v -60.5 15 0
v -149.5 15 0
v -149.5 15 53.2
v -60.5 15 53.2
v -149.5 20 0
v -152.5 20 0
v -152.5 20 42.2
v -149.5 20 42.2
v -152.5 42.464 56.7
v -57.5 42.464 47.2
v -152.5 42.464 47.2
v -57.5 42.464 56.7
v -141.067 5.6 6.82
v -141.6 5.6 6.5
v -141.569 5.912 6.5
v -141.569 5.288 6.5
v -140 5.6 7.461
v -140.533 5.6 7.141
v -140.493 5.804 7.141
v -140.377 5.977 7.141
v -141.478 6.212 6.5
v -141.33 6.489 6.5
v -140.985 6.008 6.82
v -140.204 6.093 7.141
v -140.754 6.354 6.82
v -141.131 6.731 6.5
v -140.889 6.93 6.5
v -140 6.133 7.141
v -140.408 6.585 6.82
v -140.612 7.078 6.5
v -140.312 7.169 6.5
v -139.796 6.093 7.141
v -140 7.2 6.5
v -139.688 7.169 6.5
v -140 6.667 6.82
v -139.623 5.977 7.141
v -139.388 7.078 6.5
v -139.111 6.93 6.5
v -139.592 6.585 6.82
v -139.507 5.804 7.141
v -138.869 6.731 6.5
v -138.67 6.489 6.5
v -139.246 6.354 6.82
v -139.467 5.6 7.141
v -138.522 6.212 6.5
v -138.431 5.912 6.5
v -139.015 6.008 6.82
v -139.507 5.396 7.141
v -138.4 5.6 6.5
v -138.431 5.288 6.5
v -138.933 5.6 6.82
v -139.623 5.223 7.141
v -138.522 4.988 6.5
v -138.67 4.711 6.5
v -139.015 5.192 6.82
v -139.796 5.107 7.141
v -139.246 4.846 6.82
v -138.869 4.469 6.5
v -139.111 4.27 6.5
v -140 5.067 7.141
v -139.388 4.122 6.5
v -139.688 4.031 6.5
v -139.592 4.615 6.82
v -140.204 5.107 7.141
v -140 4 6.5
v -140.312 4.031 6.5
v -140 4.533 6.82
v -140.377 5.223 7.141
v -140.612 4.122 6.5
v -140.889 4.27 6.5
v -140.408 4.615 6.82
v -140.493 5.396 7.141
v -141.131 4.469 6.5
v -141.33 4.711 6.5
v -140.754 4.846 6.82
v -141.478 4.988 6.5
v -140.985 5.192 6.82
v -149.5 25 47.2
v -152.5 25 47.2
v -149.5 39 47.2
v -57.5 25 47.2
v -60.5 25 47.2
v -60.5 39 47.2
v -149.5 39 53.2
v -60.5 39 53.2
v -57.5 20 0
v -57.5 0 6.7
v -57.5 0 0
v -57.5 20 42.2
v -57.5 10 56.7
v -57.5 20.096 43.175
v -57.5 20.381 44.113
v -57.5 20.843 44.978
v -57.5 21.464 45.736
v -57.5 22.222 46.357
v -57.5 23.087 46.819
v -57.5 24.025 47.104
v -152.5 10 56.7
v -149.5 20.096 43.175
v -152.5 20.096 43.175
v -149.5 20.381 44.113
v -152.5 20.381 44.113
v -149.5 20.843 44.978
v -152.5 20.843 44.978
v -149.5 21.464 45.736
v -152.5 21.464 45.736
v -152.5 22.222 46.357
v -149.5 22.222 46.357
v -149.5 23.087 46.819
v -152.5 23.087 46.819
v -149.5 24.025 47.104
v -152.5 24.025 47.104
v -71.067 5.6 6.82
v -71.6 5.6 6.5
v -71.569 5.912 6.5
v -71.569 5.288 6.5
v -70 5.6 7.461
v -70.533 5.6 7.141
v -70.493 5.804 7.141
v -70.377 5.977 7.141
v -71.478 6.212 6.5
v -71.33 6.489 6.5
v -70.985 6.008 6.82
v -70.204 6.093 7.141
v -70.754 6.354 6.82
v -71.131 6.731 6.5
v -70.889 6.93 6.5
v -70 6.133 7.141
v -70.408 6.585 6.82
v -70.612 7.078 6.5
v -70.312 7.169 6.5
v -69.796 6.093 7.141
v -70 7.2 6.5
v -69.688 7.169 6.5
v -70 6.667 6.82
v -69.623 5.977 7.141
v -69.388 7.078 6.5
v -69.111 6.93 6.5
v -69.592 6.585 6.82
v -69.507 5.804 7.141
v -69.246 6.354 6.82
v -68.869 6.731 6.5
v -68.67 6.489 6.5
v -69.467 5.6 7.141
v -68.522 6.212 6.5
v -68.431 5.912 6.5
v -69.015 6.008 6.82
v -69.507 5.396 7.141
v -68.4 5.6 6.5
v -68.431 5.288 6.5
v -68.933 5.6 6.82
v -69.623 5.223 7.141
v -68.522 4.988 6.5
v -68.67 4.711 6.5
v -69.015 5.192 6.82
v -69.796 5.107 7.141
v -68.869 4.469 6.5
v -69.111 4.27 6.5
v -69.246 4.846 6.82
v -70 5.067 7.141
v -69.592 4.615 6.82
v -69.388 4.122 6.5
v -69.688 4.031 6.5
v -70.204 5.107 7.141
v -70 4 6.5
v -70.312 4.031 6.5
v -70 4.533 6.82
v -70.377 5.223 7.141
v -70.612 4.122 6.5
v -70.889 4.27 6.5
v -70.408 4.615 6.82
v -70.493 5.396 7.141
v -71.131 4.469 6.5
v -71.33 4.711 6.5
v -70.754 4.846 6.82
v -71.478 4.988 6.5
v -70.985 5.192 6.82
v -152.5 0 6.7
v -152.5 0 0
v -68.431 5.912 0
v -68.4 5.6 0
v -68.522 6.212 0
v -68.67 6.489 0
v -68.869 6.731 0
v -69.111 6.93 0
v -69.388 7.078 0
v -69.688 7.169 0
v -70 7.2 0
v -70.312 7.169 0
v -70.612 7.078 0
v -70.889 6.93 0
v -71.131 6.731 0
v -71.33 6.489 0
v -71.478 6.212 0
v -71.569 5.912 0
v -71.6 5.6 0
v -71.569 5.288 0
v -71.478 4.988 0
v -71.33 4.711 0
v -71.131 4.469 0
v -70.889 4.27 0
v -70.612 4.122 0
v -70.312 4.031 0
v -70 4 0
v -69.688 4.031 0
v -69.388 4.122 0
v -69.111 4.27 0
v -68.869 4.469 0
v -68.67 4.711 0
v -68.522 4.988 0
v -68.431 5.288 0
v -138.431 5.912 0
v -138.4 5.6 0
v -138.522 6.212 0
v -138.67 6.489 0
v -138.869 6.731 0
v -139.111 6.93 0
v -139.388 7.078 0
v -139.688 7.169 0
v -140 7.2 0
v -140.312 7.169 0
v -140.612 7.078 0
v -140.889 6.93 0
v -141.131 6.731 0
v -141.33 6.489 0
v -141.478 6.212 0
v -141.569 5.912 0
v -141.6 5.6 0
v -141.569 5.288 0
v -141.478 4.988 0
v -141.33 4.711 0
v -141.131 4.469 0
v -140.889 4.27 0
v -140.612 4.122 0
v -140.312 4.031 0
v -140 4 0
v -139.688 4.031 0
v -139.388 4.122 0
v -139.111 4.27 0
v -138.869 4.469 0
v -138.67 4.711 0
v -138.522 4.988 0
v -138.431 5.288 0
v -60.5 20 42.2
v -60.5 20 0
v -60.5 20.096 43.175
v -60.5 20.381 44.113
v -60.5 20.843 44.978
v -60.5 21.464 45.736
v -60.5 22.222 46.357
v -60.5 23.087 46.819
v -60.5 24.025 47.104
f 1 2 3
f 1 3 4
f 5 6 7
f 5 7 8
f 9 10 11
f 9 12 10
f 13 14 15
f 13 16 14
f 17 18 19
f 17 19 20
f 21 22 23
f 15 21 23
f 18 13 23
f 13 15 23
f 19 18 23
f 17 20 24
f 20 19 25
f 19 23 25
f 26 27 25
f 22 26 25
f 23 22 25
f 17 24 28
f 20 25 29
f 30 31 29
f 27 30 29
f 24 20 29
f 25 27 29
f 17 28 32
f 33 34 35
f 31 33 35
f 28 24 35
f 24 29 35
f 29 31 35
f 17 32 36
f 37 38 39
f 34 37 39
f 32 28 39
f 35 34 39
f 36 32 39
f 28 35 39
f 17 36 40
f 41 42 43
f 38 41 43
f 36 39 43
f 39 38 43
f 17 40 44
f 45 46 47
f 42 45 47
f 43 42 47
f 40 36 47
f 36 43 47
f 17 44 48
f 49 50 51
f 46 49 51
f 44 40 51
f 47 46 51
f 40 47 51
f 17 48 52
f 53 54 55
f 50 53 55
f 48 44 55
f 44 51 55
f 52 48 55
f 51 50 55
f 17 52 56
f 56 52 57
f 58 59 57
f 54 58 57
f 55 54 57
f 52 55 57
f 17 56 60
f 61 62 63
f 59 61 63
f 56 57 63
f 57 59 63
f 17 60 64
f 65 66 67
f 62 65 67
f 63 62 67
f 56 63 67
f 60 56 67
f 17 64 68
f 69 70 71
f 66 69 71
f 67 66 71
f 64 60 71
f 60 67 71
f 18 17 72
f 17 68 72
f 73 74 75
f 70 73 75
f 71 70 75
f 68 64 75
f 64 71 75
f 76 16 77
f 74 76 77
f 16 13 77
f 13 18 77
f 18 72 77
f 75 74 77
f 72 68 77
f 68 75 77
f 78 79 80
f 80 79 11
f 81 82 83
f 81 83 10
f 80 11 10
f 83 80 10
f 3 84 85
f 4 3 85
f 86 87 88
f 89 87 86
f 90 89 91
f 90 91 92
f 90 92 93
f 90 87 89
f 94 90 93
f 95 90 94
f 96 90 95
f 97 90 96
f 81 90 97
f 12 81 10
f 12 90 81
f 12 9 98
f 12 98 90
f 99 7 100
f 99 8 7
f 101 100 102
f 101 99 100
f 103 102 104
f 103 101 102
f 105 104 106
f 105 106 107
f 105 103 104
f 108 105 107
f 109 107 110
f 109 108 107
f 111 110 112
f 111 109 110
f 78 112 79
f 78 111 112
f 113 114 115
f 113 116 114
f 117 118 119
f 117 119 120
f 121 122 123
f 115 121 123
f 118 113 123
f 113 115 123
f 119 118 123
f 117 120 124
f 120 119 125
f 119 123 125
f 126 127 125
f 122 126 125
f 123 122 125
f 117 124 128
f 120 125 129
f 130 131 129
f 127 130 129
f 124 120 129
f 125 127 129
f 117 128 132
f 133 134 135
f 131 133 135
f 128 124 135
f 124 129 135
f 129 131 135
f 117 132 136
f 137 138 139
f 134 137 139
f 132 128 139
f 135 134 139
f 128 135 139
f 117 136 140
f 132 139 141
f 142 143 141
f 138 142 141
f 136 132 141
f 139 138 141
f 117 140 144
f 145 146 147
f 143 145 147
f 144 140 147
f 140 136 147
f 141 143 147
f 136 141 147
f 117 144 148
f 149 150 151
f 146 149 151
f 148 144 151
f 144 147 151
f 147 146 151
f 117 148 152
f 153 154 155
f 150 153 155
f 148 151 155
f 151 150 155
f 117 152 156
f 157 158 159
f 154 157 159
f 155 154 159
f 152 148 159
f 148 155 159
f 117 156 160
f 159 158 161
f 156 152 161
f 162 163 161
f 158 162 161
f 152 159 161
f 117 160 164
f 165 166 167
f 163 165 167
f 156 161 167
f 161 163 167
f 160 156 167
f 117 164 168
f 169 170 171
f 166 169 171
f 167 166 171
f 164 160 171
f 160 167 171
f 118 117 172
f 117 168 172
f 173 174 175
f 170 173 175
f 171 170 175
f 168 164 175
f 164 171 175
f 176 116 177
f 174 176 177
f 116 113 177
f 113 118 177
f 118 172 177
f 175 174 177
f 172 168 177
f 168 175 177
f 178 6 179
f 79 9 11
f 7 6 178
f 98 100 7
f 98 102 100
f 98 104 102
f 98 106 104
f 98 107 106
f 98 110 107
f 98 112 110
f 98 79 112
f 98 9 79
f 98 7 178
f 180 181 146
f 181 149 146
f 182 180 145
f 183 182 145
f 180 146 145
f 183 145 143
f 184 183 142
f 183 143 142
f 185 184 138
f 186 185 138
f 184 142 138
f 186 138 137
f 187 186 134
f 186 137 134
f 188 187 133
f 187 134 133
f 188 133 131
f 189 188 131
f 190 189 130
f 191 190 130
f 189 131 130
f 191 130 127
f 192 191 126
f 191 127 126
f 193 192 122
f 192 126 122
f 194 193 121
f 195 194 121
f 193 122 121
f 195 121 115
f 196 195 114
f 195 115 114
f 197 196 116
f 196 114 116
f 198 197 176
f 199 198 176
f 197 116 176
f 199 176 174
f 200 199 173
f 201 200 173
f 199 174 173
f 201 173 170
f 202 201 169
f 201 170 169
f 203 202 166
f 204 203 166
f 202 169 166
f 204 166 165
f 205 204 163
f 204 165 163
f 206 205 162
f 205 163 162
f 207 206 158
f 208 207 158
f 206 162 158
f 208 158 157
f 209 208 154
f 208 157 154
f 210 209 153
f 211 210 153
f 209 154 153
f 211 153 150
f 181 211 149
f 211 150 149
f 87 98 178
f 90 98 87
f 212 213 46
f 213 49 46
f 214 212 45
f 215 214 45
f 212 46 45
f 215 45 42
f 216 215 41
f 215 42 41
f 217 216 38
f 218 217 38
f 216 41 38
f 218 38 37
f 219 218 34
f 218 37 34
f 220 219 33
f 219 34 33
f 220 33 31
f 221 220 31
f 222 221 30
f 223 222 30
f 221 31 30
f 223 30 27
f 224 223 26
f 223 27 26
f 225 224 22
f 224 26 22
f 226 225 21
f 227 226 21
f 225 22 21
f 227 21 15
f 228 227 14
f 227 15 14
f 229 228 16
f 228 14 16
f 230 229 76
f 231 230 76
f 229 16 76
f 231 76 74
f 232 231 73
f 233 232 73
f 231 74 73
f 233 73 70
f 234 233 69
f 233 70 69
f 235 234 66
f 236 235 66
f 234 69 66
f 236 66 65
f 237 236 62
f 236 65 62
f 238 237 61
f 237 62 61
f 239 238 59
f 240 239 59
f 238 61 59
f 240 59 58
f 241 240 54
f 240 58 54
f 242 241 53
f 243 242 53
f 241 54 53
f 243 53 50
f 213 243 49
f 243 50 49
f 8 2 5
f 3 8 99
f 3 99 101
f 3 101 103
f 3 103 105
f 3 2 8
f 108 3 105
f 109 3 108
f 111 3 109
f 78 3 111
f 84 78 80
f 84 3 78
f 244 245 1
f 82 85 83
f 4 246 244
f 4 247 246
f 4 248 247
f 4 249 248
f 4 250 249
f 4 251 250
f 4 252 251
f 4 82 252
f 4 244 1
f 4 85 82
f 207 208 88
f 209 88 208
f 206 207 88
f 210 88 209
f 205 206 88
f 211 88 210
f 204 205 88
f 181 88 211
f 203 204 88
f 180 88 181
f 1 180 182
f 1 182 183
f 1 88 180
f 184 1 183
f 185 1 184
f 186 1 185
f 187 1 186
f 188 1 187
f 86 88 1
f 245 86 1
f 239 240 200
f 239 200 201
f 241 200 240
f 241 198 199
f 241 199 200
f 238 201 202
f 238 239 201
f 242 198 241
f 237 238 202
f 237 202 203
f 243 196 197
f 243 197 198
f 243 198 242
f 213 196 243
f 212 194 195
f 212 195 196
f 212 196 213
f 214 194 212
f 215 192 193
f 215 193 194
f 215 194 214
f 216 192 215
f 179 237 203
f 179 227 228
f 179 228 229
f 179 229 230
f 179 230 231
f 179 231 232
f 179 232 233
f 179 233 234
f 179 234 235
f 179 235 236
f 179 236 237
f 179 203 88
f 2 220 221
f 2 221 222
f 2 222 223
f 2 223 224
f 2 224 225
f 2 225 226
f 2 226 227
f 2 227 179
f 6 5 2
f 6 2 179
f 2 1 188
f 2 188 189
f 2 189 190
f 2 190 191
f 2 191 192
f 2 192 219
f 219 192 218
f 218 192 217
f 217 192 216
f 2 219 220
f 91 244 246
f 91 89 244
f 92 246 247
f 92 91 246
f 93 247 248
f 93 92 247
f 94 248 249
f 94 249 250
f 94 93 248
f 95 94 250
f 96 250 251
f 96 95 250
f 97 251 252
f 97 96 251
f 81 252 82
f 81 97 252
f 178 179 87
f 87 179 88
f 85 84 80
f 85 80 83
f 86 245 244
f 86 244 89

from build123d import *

# Parameters (mm, degrees)
BOSS_EXTRUDE1_DEPTH       = 53.2
SKETCH2_W                 = 95
SKETCH2_H                 = 20
BOSS_EXTRUDE2_DEPTH       = 3.5
CHAMFER1_SIZE             = 50
CHAMFER1_SIZE2            = 10
SKETCH3_W                 = 89
SKETCH3_H                 = 19
BOSS_EXTRUDE3_DEPTH       = 3.5
BOSS_EXTRUDE4_START       = -3.5
BOSS_EXTRUDE4_DEPTH       = 6
FILLET1_R                 = 5
F_2_5MM_DOWEL_HOLE1_D     = 3.2
F_2_5MM_DOWEL_HOLE1_DEPTH = 6.5
F_2_5MM_DOWEL_HOLE1_TIP   = 0.96137699


with BuildPart() as part:
    # Sketch1 → Boss-Extrude1 (new body)
    with BuildSketch(Plane.XY):
        Polygon((-60.5, 15), (-60.5, 20), (-57.5, 20), (-57.5, 0), (-152.5, 0), (-152.5, 20), (-149.5, 20), (-149.5, 15), align=None)
    extrude(amount=BOSS_EXTRUDE1_DEPTH)

    # Sketch2 → Boss-Extrude2 (add)
    with BuildSketch(Plane.XY.offset(53.2)):
        with Locations((-105, 10)):
            Rectangle(SKETCH2_W, SKETCH2_H)
    extrude(amount=BOSS_EXTRUDE2_DEPTH)

    # Chamfer1
    chamfer1_edges = [part.edges().sort_by_distance(p)[0] for p in [
        (-105, 0, 56.7),
    ]]
    chamfer1_side = [part.faces().sort_by_distance(p)[0] for p in [
        (-105, 0, 28.35),
    ]]
    chamfer(chamfer1_edges, length=CHAMFER1_SIZE, length2=CHAMFER1_SIZE2, reference=chamfer1_side[0])

    # Sketch3 → Boss-Extrude3 (add)
    with BuildSketch(Plane.XY.offset(56.7)):
        with Locations((-105, 29.5)):
            Rectangle(SKETCH3_W, SKETCH3_H)
        Polygon((-152.5, 42.463842296), (-152.5, 20), (-149.5, 20), (-149.5, 39), (-60.5, 39), (-60.5, 20), (-57.5, 20), (-57.5, 42.463842296), align=None)
    extrude(amount=-BOSS_EXTRUDE3_DEPTH)

    # Sketch3<3> → Boss-Extrude4 (add)
    with BuildSketch(Plane.XY.offset(56.7).offset(BOSS_EXTRUDE4_START)):
        Polygon((-152.5, 42.463842296), (-152.5, 20), (-149.5, 20), (-149.5, 39), (-60.5, 39), (-60.5, 20), (-57.5, 20), (-57.5, 42.463842296), align=None)
    extrude(amount=-BOSS_EXTRUDE4_DEPTH)

    # Fillet1
    fillet1_edges = [part.edges().sort_by_distance(p)[0] for p in [
        (-151, 20, 47.2),
        (-59, 20, 47.2),
    ]]
    fillet(fillet1_edges, radius=FILLET1_R)

    # Ø2.5mm Dowel Hole1
    with Locations(Plane(origin=(0, 0, 0), x_dir=(-1, 0, 0), z_dir=(0, 0, -1))):
        with Locations((70, 5.6), (140, 5.6)):
            Hole(F_2_5MM_DOWEL_HOLE1_D / 2, depth=F_2_5MM_DOWEL_HOLE1_DEPTH)
            with Locations((0, 0, -(F_2_5MM_DOWEL_HOLE1_DEPTH + F_2_5MM_DOWEL_HOLE1_TIP / 2))):  # 118° drill point
                Cone(0, F_2_5MM_DOWEL_HOLE1_D / 2, F_2_5MM_DOWEL_HOLE1_TIP, mode=Mode.SUBTRACT)


solid = part.part
